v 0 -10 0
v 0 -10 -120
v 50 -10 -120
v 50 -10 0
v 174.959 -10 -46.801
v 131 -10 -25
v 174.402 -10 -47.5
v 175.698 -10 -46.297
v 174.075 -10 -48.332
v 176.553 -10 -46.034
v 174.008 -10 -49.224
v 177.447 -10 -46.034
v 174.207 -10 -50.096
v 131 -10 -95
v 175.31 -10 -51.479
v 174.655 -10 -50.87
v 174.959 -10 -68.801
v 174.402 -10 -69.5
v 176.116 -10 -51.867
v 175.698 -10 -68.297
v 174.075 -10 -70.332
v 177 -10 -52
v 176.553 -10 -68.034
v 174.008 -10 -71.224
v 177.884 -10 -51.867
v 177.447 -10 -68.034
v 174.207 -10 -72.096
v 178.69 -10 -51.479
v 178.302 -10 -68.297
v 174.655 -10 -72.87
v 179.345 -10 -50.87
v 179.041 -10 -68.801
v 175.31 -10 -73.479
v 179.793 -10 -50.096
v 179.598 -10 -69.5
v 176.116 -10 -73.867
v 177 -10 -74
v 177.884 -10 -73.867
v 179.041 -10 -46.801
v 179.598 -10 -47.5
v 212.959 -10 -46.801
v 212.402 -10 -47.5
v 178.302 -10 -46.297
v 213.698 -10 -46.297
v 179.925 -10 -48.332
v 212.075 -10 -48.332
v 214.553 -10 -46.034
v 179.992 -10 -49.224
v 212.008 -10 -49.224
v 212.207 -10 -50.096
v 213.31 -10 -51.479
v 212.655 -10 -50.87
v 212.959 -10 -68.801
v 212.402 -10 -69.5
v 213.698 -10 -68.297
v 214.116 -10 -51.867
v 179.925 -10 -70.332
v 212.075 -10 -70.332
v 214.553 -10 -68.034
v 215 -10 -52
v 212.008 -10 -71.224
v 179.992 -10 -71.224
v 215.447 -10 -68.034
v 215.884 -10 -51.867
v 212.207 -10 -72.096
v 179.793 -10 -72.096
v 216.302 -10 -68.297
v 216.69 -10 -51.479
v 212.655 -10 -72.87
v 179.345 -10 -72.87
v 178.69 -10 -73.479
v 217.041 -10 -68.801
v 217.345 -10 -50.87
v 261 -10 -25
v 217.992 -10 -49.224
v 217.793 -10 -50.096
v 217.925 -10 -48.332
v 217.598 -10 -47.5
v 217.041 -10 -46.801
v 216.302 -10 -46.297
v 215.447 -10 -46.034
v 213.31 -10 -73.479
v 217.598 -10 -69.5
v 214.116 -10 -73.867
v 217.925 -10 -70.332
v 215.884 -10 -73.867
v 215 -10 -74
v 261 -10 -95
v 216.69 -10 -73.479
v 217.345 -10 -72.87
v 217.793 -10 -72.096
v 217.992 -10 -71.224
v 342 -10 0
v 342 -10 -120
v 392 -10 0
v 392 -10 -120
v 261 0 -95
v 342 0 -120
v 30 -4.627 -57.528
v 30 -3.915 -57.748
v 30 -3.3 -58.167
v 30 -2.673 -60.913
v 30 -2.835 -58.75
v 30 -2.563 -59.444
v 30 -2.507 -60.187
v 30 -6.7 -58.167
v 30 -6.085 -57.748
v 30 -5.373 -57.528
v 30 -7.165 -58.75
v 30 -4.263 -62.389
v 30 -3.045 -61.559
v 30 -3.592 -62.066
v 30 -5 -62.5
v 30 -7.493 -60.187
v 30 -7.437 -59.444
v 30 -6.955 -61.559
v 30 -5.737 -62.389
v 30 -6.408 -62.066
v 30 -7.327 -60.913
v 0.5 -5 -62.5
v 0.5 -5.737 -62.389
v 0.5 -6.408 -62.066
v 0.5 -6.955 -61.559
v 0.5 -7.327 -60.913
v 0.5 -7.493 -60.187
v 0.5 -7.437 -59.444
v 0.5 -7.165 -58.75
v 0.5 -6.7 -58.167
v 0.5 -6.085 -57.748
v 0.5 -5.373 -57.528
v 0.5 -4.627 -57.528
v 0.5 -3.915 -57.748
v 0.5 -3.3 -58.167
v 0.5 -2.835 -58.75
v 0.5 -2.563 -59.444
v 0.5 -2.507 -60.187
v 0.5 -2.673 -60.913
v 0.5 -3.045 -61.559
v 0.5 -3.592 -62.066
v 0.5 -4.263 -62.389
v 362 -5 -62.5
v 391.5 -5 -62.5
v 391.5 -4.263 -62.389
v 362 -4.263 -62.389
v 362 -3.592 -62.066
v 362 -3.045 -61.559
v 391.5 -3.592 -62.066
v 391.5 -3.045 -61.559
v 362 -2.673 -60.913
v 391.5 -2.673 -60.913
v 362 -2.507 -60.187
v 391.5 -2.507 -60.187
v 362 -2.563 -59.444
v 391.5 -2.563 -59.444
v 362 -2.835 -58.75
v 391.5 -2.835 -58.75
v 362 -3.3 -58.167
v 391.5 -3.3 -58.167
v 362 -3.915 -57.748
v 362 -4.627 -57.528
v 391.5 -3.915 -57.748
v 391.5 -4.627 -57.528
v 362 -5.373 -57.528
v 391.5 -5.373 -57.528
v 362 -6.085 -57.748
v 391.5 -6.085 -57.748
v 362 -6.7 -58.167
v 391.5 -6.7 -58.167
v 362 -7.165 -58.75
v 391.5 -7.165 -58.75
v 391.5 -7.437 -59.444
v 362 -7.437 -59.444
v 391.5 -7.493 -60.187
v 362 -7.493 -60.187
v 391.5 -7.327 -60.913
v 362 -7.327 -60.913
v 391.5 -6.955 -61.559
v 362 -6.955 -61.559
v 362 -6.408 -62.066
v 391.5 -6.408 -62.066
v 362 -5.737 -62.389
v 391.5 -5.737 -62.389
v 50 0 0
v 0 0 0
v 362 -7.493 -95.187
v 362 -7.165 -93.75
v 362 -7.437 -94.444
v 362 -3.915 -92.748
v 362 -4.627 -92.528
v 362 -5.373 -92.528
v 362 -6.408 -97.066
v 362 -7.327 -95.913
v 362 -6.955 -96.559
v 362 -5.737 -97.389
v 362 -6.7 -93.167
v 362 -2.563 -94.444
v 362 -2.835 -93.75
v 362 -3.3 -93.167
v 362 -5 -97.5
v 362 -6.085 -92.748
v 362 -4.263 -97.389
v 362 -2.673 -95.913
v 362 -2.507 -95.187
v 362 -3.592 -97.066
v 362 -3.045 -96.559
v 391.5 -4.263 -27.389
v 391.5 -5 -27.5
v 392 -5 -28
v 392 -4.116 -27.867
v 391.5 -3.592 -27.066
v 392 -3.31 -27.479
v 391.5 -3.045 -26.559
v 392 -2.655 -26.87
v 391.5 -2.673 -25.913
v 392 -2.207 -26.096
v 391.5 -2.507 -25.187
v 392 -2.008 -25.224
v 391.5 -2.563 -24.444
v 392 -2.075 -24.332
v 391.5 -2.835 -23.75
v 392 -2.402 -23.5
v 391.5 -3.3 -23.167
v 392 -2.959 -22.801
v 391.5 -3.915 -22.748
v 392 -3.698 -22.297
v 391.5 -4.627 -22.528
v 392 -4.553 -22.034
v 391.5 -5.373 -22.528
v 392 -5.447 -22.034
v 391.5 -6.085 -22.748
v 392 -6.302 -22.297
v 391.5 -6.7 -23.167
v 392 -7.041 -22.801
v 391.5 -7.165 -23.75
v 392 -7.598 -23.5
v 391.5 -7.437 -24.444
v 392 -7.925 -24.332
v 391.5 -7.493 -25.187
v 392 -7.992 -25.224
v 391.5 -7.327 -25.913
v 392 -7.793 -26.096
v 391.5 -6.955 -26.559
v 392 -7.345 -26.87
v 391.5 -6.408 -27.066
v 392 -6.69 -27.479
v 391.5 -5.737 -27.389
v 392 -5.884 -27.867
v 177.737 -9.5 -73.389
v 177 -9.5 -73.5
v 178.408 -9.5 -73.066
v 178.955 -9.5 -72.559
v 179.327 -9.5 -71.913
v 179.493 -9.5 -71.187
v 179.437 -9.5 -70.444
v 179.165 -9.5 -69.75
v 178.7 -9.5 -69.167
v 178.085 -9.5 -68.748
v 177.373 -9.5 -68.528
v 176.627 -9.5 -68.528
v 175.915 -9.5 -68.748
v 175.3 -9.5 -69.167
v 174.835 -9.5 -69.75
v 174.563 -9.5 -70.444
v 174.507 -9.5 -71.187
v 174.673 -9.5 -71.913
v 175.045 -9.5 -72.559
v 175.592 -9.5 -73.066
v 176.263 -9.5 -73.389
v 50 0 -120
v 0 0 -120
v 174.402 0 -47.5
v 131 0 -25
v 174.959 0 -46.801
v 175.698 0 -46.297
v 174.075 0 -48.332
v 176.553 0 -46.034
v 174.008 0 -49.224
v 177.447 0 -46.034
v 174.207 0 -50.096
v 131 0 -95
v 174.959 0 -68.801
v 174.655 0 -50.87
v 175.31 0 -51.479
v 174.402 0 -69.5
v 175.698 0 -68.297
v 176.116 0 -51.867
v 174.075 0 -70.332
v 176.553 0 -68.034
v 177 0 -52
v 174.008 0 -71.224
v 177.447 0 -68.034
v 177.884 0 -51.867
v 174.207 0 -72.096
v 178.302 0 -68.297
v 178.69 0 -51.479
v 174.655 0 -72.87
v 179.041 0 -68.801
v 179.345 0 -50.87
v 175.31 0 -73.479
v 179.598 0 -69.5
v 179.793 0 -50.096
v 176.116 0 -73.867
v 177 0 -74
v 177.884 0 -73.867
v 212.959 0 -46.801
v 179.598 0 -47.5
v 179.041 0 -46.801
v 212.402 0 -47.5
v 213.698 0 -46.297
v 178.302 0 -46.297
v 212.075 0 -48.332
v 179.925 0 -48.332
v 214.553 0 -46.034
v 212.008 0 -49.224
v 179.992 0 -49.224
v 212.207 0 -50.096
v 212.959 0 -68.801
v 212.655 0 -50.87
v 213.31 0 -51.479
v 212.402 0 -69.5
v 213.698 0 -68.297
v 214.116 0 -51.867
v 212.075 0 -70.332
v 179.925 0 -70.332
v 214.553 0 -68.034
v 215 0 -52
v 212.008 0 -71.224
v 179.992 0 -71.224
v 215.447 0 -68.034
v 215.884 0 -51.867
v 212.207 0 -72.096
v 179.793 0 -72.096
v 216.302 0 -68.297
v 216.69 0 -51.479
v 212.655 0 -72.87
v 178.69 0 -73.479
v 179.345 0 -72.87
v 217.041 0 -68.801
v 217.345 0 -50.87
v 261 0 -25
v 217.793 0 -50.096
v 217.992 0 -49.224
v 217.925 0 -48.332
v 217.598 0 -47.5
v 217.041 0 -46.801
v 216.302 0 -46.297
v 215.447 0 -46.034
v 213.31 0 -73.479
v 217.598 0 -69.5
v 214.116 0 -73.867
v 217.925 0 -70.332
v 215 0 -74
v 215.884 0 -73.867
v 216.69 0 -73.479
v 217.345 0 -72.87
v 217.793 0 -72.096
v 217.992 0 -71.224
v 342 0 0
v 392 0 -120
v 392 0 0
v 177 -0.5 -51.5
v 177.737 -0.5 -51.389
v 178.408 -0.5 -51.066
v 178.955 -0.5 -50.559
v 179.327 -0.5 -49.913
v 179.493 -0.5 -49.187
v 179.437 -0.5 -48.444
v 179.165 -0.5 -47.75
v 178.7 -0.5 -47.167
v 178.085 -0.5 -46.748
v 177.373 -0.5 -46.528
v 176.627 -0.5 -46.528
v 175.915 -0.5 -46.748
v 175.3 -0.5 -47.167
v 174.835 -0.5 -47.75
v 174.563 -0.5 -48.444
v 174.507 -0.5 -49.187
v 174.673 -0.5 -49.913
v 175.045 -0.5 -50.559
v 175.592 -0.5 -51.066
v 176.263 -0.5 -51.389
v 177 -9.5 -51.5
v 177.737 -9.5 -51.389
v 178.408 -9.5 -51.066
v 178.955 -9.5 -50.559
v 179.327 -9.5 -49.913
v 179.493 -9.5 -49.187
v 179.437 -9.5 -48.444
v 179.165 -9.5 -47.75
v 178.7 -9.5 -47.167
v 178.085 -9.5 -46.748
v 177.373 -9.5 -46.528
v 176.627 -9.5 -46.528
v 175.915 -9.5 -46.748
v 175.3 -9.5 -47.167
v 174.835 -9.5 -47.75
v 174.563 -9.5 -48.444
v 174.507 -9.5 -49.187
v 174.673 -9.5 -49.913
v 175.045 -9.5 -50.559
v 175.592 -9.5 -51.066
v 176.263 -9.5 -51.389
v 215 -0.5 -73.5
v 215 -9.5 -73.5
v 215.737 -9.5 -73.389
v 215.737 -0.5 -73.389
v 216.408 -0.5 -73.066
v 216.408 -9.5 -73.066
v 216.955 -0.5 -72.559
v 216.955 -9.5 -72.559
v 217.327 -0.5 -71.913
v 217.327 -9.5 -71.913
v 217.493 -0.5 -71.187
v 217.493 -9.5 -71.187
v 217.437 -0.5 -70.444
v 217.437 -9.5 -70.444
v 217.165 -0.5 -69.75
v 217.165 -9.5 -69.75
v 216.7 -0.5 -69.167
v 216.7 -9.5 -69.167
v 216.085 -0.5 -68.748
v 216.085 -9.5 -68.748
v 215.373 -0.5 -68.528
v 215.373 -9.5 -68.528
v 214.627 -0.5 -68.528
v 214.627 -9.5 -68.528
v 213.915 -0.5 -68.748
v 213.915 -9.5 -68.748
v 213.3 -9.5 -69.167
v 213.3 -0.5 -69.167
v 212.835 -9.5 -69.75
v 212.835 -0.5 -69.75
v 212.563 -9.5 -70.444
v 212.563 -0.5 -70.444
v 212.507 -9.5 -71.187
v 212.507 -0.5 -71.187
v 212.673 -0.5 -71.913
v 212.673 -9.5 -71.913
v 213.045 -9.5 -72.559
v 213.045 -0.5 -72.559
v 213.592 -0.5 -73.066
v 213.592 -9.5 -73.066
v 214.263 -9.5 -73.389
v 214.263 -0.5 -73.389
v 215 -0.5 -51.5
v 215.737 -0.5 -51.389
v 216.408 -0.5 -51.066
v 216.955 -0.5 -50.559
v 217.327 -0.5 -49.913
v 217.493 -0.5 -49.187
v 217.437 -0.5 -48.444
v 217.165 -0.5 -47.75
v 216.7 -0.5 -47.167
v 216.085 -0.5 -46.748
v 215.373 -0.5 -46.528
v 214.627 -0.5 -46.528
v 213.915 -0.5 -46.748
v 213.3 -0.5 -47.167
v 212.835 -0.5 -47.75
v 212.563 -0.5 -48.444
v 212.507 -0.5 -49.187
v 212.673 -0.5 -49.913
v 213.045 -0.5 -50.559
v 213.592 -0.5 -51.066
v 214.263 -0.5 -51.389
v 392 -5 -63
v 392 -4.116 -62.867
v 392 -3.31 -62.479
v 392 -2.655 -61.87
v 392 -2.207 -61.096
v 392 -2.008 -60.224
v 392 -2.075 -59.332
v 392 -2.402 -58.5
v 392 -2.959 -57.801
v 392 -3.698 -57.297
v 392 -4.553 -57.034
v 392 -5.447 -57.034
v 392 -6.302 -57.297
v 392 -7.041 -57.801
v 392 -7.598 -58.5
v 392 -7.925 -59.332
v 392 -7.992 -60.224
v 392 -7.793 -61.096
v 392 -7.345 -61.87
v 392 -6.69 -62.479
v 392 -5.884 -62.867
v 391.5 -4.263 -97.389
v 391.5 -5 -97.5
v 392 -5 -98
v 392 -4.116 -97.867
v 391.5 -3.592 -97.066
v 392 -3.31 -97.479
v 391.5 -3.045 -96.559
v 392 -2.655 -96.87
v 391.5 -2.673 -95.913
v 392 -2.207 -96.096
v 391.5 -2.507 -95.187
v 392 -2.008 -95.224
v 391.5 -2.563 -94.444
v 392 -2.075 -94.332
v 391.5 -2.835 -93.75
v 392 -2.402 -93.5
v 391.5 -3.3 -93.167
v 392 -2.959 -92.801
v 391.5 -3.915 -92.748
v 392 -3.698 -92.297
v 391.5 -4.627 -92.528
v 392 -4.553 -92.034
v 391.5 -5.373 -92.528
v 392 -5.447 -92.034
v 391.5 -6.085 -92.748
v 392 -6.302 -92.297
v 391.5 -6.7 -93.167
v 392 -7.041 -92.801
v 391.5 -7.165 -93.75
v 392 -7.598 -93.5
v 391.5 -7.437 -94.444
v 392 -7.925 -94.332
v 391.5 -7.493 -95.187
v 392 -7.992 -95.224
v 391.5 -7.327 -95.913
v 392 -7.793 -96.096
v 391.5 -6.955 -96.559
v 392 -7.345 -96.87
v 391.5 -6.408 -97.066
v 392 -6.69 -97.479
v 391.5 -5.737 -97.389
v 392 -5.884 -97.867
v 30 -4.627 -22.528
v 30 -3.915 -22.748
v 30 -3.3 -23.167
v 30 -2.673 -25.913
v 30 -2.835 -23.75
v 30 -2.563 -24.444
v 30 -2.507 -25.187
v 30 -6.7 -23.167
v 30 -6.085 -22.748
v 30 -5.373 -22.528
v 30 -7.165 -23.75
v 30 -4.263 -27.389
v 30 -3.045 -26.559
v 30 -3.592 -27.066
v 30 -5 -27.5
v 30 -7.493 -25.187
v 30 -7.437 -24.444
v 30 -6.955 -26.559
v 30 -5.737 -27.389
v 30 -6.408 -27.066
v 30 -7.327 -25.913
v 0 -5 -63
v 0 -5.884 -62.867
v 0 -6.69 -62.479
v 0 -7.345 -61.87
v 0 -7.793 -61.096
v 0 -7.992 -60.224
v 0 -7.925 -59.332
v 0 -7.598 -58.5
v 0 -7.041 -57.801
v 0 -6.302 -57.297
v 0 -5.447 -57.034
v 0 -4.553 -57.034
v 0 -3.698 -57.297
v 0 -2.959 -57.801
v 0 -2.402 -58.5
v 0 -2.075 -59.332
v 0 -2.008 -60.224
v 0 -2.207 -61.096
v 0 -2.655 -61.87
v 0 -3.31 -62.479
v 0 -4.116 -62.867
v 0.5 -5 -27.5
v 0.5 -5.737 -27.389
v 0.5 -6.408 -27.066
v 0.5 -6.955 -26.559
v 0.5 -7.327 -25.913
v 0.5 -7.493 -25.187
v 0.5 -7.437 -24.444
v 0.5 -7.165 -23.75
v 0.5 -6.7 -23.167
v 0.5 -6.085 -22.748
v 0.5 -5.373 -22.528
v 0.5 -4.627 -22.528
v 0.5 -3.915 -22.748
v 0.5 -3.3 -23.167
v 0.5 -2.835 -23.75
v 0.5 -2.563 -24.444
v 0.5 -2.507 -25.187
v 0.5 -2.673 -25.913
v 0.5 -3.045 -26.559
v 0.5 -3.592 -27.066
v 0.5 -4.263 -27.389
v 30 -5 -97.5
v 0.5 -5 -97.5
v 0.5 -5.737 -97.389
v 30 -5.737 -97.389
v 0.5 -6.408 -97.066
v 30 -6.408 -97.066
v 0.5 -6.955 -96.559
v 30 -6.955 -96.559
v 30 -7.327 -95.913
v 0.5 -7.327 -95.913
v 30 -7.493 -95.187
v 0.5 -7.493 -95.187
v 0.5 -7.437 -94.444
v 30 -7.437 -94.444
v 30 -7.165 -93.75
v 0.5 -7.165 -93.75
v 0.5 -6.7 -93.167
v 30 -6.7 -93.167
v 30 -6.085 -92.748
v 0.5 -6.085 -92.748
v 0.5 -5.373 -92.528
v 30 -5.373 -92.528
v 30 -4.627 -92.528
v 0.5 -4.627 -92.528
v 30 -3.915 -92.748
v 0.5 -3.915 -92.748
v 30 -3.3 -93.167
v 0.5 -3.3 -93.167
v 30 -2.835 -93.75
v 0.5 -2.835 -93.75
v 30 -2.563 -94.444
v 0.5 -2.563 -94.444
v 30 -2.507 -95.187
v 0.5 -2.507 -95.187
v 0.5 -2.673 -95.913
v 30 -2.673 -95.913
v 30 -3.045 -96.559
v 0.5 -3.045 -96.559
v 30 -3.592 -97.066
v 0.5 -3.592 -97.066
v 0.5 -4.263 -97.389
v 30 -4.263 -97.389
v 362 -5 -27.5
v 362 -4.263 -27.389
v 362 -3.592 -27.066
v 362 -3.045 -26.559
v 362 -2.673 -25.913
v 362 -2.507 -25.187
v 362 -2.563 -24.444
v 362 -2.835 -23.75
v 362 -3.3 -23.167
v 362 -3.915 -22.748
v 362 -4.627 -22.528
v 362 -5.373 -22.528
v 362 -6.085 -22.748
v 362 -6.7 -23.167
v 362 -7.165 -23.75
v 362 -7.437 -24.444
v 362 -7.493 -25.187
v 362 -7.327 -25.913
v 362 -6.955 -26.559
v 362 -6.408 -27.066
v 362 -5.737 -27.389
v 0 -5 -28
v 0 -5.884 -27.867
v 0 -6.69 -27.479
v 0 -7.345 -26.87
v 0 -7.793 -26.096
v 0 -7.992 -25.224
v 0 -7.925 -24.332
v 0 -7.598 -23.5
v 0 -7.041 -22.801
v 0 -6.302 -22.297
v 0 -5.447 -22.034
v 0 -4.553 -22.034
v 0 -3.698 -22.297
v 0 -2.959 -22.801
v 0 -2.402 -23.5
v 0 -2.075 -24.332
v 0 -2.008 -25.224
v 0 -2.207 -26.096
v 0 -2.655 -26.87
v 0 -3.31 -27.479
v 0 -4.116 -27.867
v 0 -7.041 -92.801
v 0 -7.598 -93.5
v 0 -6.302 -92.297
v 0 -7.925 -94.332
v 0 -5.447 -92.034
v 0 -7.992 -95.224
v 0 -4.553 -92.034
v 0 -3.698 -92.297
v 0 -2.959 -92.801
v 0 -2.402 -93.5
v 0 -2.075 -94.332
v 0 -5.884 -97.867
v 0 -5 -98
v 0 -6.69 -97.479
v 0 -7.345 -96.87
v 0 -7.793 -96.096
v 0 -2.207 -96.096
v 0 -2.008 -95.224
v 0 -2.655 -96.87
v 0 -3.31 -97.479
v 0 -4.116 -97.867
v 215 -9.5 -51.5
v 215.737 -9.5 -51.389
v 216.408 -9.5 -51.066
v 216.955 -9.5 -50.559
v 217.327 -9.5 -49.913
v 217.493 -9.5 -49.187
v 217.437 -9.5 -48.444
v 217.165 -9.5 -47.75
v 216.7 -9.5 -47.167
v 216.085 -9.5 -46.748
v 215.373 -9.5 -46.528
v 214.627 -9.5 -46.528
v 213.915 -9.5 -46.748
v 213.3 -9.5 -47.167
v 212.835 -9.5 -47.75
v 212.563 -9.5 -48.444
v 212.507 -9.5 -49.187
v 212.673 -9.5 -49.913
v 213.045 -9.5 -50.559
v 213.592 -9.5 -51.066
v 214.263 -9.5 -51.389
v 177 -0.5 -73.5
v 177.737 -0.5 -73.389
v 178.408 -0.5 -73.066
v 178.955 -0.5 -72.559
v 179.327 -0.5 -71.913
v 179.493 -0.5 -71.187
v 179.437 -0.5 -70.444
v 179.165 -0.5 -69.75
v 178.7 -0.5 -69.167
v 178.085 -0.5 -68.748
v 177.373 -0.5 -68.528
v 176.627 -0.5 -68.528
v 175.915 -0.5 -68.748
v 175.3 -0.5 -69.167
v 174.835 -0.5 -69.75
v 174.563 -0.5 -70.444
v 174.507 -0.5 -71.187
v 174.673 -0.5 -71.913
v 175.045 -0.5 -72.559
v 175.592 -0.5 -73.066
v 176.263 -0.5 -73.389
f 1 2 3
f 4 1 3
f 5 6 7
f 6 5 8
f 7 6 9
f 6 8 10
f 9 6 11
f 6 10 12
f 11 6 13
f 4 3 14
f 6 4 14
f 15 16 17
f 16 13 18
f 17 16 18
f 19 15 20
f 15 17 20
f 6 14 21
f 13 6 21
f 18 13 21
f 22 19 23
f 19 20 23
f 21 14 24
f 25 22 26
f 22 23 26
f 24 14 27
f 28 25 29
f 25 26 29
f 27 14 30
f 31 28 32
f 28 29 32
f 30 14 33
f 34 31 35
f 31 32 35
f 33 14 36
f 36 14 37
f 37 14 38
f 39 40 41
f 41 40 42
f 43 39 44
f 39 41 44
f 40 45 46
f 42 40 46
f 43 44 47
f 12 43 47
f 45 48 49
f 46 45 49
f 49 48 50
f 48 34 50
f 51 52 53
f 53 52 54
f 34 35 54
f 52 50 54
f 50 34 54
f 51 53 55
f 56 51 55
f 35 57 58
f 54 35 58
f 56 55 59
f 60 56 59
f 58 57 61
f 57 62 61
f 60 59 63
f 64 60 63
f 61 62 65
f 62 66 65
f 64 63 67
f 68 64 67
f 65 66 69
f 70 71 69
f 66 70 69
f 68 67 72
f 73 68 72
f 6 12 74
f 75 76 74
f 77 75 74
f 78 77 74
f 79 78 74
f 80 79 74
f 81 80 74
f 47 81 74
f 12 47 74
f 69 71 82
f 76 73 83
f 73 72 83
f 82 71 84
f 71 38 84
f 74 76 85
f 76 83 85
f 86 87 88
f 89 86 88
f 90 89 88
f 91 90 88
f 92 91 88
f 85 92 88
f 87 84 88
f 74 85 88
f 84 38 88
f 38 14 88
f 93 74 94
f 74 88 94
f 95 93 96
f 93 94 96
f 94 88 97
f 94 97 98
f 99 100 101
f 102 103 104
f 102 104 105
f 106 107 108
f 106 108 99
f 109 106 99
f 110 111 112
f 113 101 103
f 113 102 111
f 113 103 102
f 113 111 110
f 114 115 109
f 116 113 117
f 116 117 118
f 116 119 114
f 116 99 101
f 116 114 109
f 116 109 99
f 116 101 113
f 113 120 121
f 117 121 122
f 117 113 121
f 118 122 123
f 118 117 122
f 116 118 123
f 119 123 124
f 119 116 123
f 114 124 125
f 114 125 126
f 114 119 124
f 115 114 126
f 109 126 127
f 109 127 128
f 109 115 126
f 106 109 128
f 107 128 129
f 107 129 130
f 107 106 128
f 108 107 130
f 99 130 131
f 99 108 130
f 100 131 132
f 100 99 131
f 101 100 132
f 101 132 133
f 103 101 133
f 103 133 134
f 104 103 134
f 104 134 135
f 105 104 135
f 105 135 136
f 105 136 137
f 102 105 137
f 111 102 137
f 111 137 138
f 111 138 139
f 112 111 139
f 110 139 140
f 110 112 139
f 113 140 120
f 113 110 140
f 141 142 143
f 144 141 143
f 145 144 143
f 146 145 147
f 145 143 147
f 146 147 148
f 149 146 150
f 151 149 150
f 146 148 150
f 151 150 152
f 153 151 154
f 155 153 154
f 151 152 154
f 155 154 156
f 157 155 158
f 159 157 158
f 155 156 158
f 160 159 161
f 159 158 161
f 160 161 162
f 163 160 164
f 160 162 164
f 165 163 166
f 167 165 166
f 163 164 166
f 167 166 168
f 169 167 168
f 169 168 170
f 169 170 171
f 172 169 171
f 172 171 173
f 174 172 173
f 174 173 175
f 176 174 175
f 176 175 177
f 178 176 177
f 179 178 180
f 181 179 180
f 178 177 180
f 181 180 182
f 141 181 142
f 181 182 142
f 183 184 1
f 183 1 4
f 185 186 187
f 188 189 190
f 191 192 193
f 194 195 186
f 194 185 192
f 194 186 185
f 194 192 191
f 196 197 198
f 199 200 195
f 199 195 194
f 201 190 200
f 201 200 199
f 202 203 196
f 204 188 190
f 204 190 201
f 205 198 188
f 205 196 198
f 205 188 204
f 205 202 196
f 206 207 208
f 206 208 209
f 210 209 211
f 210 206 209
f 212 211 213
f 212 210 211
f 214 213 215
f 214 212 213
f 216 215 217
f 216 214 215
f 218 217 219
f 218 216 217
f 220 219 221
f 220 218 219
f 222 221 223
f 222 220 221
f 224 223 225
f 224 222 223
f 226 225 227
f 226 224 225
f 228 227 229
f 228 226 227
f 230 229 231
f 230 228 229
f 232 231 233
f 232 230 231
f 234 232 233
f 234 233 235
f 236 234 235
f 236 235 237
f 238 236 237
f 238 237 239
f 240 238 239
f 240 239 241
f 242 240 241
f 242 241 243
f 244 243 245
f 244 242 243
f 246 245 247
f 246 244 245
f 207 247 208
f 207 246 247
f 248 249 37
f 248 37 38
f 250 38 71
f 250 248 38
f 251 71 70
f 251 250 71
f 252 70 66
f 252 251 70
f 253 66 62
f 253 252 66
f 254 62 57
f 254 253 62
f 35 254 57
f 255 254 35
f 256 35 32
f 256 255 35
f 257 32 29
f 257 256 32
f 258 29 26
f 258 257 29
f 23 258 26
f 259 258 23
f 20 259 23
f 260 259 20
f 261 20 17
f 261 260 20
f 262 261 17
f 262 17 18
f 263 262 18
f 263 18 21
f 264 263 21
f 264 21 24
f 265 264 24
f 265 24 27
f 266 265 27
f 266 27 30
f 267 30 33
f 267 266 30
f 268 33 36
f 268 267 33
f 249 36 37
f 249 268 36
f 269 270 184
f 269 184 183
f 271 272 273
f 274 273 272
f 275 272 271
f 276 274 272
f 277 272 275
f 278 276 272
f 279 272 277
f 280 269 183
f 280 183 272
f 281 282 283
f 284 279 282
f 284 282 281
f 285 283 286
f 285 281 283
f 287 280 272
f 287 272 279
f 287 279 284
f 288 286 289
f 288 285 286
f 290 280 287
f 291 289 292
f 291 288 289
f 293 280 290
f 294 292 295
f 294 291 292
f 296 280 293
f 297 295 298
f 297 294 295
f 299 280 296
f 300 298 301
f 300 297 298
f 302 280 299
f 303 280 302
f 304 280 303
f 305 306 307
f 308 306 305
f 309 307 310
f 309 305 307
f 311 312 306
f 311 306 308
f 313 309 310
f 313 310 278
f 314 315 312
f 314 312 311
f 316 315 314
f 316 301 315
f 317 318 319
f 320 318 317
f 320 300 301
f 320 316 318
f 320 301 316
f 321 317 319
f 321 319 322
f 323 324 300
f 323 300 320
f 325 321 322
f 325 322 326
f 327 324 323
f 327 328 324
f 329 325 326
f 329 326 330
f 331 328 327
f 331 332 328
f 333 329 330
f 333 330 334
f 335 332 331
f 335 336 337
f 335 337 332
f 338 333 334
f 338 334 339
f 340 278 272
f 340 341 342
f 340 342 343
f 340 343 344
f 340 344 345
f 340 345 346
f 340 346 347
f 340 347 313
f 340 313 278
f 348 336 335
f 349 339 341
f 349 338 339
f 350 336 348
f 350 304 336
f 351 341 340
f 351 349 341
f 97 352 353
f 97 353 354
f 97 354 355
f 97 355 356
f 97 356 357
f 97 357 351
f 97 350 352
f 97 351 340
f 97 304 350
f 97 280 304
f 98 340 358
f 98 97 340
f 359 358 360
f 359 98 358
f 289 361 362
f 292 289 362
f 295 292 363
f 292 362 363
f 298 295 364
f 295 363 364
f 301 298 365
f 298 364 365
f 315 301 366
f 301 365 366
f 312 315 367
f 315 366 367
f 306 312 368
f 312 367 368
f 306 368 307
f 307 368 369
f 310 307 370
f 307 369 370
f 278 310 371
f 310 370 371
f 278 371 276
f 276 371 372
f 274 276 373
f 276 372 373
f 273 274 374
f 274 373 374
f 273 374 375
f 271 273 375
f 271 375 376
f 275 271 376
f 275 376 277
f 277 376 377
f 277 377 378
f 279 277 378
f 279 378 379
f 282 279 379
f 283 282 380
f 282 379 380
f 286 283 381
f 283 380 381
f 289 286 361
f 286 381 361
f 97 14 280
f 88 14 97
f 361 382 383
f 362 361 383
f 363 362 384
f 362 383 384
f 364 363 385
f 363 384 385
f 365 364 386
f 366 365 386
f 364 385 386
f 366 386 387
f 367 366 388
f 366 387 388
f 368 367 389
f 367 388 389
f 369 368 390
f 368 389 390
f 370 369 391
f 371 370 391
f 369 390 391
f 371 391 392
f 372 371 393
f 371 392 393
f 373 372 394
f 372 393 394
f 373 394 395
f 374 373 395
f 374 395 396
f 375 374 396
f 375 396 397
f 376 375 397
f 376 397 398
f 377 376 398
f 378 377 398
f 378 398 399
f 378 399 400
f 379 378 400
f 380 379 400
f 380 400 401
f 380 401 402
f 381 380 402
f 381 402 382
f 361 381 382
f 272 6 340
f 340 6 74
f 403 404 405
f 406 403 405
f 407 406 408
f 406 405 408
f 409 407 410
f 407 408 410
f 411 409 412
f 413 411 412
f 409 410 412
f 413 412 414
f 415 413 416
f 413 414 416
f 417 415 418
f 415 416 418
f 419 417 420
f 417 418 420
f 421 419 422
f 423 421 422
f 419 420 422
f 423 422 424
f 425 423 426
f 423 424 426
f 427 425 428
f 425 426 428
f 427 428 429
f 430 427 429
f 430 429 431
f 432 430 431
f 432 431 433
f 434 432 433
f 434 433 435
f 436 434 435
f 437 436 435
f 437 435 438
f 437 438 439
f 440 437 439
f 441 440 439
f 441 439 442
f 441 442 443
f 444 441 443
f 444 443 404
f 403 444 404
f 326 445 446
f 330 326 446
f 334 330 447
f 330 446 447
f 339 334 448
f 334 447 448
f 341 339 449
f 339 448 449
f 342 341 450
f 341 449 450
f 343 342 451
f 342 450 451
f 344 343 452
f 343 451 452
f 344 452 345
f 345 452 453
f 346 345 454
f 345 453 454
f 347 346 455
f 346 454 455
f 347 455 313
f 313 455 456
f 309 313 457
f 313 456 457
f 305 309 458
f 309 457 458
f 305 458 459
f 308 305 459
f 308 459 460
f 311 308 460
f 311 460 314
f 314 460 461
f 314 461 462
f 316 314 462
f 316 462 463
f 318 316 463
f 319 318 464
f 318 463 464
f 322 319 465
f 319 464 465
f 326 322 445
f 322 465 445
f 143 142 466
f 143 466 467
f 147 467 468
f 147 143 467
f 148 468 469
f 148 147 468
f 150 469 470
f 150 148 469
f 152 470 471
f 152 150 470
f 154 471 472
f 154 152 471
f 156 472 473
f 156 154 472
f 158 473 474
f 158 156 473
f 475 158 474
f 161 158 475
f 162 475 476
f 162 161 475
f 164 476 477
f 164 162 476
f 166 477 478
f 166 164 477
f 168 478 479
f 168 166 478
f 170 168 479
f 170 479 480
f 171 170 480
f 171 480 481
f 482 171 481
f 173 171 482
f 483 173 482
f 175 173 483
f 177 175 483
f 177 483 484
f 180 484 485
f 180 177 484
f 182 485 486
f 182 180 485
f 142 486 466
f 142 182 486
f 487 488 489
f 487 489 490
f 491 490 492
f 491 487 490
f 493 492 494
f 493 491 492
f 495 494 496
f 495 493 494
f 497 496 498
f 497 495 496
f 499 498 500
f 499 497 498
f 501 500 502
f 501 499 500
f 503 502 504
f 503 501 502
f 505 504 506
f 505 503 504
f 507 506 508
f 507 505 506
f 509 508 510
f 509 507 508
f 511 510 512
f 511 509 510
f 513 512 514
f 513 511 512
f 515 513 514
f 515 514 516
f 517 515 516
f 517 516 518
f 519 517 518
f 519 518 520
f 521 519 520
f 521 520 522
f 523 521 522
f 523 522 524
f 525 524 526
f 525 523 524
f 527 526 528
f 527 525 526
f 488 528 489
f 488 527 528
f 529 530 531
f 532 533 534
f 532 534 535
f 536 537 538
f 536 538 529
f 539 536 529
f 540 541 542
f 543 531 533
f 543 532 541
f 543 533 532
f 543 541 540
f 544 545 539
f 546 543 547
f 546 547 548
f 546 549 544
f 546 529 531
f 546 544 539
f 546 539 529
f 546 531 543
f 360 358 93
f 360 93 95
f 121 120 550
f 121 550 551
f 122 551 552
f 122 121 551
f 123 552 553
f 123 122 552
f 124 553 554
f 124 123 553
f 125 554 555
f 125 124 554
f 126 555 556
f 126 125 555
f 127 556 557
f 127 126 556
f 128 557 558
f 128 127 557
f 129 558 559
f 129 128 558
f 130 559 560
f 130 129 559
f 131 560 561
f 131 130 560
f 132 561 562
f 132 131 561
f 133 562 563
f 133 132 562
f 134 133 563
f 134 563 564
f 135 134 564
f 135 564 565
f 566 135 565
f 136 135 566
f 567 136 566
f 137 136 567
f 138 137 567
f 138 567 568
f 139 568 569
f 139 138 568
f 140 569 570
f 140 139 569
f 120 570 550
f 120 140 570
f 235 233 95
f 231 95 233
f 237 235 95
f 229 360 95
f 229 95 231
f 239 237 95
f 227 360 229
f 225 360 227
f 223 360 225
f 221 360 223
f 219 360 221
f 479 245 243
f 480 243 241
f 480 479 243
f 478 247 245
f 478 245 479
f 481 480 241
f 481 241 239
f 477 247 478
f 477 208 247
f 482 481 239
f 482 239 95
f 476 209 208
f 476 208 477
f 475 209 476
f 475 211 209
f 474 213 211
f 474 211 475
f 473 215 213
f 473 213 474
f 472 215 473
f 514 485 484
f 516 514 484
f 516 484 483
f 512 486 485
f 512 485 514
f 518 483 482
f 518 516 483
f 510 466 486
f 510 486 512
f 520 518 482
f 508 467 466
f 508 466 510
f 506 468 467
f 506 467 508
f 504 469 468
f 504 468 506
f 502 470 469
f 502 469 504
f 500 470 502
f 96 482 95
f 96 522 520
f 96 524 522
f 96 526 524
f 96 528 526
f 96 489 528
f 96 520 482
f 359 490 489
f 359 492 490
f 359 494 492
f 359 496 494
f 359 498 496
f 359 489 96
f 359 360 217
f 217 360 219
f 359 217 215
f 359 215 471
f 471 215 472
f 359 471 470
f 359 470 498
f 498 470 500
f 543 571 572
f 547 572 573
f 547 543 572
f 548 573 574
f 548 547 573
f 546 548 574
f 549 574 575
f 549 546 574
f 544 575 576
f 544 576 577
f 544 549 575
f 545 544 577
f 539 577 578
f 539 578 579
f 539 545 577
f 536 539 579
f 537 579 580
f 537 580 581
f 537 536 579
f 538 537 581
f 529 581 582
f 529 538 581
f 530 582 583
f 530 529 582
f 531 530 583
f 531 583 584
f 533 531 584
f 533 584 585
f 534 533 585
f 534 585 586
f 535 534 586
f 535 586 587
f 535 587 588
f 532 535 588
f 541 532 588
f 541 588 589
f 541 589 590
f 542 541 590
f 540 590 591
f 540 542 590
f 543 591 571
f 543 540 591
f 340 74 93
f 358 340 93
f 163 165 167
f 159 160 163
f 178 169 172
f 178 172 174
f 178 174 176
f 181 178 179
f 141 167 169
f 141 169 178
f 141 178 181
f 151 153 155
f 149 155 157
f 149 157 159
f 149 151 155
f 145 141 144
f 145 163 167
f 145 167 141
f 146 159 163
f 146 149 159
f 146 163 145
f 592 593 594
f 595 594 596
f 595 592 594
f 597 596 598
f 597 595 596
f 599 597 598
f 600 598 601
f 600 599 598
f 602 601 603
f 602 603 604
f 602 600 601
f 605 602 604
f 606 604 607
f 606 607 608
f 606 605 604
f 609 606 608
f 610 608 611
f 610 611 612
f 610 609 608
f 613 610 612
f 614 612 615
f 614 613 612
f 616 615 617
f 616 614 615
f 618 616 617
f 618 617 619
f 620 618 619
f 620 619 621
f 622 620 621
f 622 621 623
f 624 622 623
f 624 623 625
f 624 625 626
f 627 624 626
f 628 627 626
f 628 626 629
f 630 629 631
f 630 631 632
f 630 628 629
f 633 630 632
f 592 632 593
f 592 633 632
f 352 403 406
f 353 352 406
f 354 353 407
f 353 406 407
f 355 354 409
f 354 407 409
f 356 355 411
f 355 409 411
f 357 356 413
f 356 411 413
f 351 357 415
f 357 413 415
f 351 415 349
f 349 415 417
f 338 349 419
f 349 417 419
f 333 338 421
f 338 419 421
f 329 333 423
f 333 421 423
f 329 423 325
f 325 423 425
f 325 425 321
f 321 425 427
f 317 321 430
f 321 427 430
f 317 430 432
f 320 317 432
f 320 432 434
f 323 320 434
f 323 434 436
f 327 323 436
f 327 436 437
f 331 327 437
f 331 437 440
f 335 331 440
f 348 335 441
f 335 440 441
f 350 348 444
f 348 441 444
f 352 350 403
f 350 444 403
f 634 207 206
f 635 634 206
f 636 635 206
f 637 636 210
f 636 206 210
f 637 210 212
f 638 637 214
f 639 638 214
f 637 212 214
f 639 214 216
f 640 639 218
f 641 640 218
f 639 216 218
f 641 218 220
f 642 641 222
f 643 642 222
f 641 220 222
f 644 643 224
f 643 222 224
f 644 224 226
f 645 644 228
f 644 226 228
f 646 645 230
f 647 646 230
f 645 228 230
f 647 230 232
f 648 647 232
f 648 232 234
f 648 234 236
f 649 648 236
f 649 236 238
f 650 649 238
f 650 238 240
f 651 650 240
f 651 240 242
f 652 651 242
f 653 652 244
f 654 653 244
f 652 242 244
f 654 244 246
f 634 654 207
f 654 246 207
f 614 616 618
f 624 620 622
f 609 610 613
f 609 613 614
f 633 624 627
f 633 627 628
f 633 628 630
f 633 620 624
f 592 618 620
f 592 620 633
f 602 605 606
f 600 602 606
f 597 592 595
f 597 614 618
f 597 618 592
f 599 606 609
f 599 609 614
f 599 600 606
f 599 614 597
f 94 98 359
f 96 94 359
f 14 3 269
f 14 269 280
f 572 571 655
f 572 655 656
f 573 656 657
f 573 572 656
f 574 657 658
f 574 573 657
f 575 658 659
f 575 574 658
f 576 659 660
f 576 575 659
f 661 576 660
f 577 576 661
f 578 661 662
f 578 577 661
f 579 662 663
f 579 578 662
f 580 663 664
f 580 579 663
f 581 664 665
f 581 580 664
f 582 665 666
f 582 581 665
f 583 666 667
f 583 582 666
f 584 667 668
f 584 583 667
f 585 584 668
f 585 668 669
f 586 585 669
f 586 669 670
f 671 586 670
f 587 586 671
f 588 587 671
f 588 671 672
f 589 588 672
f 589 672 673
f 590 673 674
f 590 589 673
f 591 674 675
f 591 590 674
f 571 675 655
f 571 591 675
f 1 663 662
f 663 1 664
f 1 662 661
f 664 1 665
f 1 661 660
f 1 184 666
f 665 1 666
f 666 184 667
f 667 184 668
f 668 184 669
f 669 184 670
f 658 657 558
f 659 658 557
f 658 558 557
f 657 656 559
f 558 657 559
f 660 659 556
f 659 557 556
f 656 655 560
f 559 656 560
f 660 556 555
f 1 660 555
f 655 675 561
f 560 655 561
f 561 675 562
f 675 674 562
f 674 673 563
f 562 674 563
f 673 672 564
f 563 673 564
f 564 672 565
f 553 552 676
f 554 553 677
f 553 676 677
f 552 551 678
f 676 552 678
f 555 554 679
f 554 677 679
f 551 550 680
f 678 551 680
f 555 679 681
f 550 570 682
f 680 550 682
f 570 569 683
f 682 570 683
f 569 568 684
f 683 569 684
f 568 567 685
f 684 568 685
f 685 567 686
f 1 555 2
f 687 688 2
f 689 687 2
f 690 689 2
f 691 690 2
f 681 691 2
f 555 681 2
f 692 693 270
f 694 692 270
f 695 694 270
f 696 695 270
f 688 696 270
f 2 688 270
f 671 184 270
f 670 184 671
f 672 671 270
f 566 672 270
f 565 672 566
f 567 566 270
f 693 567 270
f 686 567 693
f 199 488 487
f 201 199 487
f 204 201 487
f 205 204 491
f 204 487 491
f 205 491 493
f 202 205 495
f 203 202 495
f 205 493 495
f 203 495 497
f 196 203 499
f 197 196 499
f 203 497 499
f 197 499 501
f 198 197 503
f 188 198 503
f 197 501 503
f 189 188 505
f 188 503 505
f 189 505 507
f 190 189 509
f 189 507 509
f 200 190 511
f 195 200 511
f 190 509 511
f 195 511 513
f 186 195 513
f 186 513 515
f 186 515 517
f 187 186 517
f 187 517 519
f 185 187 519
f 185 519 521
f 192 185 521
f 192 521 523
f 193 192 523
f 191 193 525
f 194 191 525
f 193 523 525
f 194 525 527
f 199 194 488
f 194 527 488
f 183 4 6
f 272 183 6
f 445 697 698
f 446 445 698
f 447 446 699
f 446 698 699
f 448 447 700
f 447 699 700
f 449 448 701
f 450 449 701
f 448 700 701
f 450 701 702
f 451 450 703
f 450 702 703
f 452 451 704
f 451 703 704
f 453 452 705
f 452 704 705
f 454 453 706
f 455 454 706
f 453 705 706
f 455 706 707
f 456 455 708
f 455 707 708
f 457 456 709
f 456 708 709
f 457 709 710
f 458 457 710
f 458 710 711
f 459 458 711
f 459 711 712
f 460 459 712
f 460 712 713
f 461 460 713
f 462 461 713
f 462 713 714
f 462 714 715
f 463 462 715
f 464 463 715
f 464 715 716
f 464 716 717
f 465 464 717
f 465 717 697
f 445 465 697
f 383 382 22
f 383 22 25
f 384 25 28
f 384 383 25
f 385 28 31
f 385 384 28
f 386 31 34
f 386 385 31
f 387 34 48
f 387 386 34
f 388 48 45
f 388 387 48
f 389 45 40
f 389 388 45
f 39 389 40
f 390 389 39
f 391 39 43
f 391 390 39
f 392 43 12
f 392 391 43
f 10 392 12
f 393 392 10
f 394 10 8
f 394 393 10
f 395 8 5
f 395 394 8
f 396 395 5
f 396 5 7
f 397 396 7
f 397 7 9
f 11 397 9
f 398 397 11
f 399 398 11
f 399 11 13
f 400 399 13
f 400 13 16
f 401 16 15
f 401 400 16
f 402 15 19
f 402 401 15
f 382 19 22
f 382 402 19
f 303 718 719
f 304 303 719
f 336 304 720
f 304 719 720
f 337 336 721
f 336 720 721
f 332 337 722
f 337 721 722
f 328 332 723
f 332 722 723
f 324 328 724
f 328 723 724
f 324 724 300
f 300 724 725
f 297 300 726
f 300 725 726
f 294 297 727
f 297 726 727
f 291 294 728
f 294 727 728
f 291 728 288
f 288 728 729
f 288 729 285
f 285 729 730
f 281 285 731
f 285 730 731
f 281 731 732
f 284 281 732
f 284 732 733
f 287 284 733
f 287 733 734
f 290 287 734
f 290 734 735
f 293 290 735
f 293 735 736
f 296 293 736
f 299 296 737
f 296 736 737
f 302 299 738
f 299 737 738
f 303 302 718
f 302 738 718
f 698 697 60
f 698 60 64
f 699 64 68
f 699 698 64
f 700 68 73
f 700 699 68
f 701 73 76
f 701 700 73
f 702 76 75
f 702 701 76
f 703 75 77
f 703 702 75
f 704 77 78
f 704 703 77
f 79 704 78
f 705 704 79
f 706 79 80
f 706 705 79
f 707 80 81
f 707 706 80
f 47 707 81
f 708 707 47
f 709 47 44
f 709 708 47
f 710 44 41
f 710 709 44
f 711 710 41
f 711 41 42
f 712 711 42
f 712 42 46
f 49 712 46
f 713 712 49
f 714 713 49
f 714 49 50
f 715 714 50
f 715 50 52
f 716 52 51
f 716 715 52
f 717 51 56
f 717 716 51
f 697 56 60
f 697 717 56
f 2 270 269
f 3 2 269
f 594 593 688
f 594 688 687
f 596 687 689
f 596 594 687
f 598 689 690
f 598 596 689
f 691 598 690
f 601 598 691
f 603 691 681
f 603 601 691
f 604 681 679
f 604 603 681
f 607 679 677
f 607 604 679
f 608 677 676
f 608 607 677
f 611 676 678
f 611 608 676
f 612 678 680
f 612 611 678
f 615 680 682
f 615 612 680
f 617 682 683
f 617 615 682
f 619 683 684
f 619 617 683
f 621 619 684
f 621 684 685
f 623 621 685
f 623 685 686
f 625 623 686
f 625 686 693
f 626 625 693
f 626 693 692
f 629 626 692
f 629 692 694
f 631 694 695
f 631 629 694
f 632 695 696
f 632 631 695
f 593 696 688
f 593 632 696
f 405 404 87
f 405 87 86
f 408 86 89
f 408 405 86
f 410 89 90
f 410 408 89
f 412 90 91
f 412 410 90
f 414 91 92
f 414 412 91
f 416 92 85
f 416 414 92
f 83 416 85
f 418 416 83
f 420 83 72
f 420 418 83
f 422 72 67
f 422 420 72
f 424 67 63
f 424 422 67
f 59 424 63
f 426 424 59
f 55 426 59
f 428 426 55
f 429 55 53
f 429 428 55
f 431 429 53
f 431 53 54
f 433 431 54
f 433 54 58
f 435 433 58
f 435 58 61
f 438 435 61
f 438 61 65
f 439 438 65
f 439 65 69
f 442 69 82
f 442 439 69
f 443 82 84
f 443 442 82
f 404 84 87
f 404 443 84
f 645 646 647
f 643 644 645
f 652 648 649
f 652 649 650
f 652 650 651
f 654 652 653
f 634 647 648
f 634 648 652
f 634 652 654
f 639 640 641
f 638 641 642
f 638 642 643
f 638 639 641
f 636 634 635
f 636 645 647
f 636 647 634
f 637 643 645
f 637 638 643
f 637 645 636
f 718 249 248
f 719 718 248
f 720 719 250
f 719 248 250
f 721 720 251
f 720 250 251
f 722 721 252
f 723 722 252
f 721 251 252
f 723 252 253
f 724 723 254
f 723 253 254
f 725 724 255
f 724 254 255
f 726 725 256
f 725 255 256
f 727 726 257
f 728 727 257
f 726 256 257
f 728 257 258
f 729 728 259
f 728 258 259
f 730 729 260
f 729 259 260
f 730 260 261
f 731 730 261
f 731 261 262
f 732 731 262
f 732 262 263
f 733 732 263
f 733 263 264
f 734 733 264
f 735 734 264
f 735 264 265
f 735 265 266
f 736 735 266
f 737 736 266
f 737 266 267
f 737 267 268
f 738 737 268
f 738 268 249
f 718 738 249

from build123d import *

# Parameters (mm, degrees)
CROQUIS1_W              = 392
CROQUIS1_H              = 120
SALIENTE_EXTRUIR1_DEPTH = 10
CROQUIS2_R              = 2.5
CORTAR_EXTRUIR1_DEPTH   = 411.078041353
CHAFL_N1_SIZE           = 0.5
CROQUIS3_R              = 2.5
CORTAR_EXTRUIR2_DEPTH   = 30
CORTAR_EXTRUIR3_START   = -30
CROQUIS4_R              = 2.5
CORTAR_EXTRUIR3_DEPTH   = 30
CHAFL_N2_SIZE           = 0.5
CORTAR_EXTRUIR4_DEPTH   = 411.078041353


with BuildPart() as part:
    # Croquis1 → Saliente-Extruir1 (new body)
    with BuildSketch(Plane(origin=(0, 0, 0), x_dir=(1, 0, 0), z_dir=(0, 1, 0))):
        with Locations((196, 60)):
            Rectangle(CROQUIS1_W, CROQUIS1_H)
    extrude(amount=-SALIENTE_EXTRUIR1_DEPTH)

    # Croquis2 → Cortar-Extruir1 (cut, through all)
    with BuildSketch(Plane.XZ.offset(10)):
        with Locations(Location((177, -49, 0), (0, 0, 270))):
            Circle(CROQUIS2_R)
        with Locations(Location((177, -71, 0), (0, 0, 270))):
            Circle(CROQUIS2_R)
        with Locations(Location((215, -49, 0), (0, 0, 270))):
            Circle(CROQUIS2_R)
        with Locations(Location((215, -71, 0), (0, 0, 270))):
            Circle(CROQUIS2_R)
    extrude(amount=-CORTAR_EXTRUIR1_DEPTH, mode=Mode.SUBTRACT)

    # Chaflán1
    chafl_n1_edges = [part.edges().sort_by_distance(p)[0] for p in [
        (177, 0, -46.5),
        (177, -10, -46.5),
        (177, 0, -68.5),
        (177, -10, -68.5),
        (215, 0, -46.5),
        (215, -10, -46.5),
        (215, 0, -68.5),
        (215, -10, -68.5),
    ]]
    chamfer(chafl_n1_edges, length=CHAFL_N1_SIZE)

    # Croquis3 → Cortar-Extruir2 (cut)
    with BuildSketch(Plane(origin=(392, 0, 0), x_dir=(0, 0, -1), z_dir=(1, 0, 0))):
        with Locations((25, -5)):
            Circle(CROQUIS3_R)
        with Locations((60, -5)):
            Circle(CROQUIS3_R)
        with Locations((95, -5)):
            Circle(CROQUIS3_R)
    extrude(amount=-CORTAR_EXTRUIR2_DEPTH, mode=Mode.SUBTRACT)

    # Croquis4 → Cortar-Extruir3 (cut)
    with BuildSketch(Plane.ZY.offset(CORTAR_EXTRUIR3_START)):
        with Locations(Location((-25, -5, 0), (0, 0, 180))):
            Circle(CROQUIS4_R)
        with Locations(Location((-60, -5, 0), (0, 0, 180))):
            Circle(CROQUIS4_R)
        with Locations(Location((-95, -5, 0), (0, 0, 180))):
            Circle(CROQUIS4_R)
    extrude(amount=CORTAR_EXTRUIR3_DEPTH, mode=Mode.SUBTRACT)

    # Chaflán2
    chafl_n2_edges = [part.edges().sort_by_distance(p)[0] for p in [
        (392, -5, -22.5),
        (392, -5, -57.5),
        (392, -5, -92.5),
        (0, -5, -22.5),
        (0, -5, -57.5),
        (0, -5, -92.5),
    ]]
    chamfer(chafl_n2_edges, length=CHAFL_N2_SIZE)

    # Croquis5 → Cortar-Extruir4 (cut, through all)
    with BuildSketch(Plane.XZ.offset(10)):
        Polygon((50, 0), (131, -25), (261, -25), (342, 0), align=None)
        Polygon((261, -95), (342, -120), (50, -120), (131, -95), align=None)
    extrude(amount=-CORTAR_EXTRUIR4_DEPTH, mode=Mode.SUBTRACT)


solid = part.part
